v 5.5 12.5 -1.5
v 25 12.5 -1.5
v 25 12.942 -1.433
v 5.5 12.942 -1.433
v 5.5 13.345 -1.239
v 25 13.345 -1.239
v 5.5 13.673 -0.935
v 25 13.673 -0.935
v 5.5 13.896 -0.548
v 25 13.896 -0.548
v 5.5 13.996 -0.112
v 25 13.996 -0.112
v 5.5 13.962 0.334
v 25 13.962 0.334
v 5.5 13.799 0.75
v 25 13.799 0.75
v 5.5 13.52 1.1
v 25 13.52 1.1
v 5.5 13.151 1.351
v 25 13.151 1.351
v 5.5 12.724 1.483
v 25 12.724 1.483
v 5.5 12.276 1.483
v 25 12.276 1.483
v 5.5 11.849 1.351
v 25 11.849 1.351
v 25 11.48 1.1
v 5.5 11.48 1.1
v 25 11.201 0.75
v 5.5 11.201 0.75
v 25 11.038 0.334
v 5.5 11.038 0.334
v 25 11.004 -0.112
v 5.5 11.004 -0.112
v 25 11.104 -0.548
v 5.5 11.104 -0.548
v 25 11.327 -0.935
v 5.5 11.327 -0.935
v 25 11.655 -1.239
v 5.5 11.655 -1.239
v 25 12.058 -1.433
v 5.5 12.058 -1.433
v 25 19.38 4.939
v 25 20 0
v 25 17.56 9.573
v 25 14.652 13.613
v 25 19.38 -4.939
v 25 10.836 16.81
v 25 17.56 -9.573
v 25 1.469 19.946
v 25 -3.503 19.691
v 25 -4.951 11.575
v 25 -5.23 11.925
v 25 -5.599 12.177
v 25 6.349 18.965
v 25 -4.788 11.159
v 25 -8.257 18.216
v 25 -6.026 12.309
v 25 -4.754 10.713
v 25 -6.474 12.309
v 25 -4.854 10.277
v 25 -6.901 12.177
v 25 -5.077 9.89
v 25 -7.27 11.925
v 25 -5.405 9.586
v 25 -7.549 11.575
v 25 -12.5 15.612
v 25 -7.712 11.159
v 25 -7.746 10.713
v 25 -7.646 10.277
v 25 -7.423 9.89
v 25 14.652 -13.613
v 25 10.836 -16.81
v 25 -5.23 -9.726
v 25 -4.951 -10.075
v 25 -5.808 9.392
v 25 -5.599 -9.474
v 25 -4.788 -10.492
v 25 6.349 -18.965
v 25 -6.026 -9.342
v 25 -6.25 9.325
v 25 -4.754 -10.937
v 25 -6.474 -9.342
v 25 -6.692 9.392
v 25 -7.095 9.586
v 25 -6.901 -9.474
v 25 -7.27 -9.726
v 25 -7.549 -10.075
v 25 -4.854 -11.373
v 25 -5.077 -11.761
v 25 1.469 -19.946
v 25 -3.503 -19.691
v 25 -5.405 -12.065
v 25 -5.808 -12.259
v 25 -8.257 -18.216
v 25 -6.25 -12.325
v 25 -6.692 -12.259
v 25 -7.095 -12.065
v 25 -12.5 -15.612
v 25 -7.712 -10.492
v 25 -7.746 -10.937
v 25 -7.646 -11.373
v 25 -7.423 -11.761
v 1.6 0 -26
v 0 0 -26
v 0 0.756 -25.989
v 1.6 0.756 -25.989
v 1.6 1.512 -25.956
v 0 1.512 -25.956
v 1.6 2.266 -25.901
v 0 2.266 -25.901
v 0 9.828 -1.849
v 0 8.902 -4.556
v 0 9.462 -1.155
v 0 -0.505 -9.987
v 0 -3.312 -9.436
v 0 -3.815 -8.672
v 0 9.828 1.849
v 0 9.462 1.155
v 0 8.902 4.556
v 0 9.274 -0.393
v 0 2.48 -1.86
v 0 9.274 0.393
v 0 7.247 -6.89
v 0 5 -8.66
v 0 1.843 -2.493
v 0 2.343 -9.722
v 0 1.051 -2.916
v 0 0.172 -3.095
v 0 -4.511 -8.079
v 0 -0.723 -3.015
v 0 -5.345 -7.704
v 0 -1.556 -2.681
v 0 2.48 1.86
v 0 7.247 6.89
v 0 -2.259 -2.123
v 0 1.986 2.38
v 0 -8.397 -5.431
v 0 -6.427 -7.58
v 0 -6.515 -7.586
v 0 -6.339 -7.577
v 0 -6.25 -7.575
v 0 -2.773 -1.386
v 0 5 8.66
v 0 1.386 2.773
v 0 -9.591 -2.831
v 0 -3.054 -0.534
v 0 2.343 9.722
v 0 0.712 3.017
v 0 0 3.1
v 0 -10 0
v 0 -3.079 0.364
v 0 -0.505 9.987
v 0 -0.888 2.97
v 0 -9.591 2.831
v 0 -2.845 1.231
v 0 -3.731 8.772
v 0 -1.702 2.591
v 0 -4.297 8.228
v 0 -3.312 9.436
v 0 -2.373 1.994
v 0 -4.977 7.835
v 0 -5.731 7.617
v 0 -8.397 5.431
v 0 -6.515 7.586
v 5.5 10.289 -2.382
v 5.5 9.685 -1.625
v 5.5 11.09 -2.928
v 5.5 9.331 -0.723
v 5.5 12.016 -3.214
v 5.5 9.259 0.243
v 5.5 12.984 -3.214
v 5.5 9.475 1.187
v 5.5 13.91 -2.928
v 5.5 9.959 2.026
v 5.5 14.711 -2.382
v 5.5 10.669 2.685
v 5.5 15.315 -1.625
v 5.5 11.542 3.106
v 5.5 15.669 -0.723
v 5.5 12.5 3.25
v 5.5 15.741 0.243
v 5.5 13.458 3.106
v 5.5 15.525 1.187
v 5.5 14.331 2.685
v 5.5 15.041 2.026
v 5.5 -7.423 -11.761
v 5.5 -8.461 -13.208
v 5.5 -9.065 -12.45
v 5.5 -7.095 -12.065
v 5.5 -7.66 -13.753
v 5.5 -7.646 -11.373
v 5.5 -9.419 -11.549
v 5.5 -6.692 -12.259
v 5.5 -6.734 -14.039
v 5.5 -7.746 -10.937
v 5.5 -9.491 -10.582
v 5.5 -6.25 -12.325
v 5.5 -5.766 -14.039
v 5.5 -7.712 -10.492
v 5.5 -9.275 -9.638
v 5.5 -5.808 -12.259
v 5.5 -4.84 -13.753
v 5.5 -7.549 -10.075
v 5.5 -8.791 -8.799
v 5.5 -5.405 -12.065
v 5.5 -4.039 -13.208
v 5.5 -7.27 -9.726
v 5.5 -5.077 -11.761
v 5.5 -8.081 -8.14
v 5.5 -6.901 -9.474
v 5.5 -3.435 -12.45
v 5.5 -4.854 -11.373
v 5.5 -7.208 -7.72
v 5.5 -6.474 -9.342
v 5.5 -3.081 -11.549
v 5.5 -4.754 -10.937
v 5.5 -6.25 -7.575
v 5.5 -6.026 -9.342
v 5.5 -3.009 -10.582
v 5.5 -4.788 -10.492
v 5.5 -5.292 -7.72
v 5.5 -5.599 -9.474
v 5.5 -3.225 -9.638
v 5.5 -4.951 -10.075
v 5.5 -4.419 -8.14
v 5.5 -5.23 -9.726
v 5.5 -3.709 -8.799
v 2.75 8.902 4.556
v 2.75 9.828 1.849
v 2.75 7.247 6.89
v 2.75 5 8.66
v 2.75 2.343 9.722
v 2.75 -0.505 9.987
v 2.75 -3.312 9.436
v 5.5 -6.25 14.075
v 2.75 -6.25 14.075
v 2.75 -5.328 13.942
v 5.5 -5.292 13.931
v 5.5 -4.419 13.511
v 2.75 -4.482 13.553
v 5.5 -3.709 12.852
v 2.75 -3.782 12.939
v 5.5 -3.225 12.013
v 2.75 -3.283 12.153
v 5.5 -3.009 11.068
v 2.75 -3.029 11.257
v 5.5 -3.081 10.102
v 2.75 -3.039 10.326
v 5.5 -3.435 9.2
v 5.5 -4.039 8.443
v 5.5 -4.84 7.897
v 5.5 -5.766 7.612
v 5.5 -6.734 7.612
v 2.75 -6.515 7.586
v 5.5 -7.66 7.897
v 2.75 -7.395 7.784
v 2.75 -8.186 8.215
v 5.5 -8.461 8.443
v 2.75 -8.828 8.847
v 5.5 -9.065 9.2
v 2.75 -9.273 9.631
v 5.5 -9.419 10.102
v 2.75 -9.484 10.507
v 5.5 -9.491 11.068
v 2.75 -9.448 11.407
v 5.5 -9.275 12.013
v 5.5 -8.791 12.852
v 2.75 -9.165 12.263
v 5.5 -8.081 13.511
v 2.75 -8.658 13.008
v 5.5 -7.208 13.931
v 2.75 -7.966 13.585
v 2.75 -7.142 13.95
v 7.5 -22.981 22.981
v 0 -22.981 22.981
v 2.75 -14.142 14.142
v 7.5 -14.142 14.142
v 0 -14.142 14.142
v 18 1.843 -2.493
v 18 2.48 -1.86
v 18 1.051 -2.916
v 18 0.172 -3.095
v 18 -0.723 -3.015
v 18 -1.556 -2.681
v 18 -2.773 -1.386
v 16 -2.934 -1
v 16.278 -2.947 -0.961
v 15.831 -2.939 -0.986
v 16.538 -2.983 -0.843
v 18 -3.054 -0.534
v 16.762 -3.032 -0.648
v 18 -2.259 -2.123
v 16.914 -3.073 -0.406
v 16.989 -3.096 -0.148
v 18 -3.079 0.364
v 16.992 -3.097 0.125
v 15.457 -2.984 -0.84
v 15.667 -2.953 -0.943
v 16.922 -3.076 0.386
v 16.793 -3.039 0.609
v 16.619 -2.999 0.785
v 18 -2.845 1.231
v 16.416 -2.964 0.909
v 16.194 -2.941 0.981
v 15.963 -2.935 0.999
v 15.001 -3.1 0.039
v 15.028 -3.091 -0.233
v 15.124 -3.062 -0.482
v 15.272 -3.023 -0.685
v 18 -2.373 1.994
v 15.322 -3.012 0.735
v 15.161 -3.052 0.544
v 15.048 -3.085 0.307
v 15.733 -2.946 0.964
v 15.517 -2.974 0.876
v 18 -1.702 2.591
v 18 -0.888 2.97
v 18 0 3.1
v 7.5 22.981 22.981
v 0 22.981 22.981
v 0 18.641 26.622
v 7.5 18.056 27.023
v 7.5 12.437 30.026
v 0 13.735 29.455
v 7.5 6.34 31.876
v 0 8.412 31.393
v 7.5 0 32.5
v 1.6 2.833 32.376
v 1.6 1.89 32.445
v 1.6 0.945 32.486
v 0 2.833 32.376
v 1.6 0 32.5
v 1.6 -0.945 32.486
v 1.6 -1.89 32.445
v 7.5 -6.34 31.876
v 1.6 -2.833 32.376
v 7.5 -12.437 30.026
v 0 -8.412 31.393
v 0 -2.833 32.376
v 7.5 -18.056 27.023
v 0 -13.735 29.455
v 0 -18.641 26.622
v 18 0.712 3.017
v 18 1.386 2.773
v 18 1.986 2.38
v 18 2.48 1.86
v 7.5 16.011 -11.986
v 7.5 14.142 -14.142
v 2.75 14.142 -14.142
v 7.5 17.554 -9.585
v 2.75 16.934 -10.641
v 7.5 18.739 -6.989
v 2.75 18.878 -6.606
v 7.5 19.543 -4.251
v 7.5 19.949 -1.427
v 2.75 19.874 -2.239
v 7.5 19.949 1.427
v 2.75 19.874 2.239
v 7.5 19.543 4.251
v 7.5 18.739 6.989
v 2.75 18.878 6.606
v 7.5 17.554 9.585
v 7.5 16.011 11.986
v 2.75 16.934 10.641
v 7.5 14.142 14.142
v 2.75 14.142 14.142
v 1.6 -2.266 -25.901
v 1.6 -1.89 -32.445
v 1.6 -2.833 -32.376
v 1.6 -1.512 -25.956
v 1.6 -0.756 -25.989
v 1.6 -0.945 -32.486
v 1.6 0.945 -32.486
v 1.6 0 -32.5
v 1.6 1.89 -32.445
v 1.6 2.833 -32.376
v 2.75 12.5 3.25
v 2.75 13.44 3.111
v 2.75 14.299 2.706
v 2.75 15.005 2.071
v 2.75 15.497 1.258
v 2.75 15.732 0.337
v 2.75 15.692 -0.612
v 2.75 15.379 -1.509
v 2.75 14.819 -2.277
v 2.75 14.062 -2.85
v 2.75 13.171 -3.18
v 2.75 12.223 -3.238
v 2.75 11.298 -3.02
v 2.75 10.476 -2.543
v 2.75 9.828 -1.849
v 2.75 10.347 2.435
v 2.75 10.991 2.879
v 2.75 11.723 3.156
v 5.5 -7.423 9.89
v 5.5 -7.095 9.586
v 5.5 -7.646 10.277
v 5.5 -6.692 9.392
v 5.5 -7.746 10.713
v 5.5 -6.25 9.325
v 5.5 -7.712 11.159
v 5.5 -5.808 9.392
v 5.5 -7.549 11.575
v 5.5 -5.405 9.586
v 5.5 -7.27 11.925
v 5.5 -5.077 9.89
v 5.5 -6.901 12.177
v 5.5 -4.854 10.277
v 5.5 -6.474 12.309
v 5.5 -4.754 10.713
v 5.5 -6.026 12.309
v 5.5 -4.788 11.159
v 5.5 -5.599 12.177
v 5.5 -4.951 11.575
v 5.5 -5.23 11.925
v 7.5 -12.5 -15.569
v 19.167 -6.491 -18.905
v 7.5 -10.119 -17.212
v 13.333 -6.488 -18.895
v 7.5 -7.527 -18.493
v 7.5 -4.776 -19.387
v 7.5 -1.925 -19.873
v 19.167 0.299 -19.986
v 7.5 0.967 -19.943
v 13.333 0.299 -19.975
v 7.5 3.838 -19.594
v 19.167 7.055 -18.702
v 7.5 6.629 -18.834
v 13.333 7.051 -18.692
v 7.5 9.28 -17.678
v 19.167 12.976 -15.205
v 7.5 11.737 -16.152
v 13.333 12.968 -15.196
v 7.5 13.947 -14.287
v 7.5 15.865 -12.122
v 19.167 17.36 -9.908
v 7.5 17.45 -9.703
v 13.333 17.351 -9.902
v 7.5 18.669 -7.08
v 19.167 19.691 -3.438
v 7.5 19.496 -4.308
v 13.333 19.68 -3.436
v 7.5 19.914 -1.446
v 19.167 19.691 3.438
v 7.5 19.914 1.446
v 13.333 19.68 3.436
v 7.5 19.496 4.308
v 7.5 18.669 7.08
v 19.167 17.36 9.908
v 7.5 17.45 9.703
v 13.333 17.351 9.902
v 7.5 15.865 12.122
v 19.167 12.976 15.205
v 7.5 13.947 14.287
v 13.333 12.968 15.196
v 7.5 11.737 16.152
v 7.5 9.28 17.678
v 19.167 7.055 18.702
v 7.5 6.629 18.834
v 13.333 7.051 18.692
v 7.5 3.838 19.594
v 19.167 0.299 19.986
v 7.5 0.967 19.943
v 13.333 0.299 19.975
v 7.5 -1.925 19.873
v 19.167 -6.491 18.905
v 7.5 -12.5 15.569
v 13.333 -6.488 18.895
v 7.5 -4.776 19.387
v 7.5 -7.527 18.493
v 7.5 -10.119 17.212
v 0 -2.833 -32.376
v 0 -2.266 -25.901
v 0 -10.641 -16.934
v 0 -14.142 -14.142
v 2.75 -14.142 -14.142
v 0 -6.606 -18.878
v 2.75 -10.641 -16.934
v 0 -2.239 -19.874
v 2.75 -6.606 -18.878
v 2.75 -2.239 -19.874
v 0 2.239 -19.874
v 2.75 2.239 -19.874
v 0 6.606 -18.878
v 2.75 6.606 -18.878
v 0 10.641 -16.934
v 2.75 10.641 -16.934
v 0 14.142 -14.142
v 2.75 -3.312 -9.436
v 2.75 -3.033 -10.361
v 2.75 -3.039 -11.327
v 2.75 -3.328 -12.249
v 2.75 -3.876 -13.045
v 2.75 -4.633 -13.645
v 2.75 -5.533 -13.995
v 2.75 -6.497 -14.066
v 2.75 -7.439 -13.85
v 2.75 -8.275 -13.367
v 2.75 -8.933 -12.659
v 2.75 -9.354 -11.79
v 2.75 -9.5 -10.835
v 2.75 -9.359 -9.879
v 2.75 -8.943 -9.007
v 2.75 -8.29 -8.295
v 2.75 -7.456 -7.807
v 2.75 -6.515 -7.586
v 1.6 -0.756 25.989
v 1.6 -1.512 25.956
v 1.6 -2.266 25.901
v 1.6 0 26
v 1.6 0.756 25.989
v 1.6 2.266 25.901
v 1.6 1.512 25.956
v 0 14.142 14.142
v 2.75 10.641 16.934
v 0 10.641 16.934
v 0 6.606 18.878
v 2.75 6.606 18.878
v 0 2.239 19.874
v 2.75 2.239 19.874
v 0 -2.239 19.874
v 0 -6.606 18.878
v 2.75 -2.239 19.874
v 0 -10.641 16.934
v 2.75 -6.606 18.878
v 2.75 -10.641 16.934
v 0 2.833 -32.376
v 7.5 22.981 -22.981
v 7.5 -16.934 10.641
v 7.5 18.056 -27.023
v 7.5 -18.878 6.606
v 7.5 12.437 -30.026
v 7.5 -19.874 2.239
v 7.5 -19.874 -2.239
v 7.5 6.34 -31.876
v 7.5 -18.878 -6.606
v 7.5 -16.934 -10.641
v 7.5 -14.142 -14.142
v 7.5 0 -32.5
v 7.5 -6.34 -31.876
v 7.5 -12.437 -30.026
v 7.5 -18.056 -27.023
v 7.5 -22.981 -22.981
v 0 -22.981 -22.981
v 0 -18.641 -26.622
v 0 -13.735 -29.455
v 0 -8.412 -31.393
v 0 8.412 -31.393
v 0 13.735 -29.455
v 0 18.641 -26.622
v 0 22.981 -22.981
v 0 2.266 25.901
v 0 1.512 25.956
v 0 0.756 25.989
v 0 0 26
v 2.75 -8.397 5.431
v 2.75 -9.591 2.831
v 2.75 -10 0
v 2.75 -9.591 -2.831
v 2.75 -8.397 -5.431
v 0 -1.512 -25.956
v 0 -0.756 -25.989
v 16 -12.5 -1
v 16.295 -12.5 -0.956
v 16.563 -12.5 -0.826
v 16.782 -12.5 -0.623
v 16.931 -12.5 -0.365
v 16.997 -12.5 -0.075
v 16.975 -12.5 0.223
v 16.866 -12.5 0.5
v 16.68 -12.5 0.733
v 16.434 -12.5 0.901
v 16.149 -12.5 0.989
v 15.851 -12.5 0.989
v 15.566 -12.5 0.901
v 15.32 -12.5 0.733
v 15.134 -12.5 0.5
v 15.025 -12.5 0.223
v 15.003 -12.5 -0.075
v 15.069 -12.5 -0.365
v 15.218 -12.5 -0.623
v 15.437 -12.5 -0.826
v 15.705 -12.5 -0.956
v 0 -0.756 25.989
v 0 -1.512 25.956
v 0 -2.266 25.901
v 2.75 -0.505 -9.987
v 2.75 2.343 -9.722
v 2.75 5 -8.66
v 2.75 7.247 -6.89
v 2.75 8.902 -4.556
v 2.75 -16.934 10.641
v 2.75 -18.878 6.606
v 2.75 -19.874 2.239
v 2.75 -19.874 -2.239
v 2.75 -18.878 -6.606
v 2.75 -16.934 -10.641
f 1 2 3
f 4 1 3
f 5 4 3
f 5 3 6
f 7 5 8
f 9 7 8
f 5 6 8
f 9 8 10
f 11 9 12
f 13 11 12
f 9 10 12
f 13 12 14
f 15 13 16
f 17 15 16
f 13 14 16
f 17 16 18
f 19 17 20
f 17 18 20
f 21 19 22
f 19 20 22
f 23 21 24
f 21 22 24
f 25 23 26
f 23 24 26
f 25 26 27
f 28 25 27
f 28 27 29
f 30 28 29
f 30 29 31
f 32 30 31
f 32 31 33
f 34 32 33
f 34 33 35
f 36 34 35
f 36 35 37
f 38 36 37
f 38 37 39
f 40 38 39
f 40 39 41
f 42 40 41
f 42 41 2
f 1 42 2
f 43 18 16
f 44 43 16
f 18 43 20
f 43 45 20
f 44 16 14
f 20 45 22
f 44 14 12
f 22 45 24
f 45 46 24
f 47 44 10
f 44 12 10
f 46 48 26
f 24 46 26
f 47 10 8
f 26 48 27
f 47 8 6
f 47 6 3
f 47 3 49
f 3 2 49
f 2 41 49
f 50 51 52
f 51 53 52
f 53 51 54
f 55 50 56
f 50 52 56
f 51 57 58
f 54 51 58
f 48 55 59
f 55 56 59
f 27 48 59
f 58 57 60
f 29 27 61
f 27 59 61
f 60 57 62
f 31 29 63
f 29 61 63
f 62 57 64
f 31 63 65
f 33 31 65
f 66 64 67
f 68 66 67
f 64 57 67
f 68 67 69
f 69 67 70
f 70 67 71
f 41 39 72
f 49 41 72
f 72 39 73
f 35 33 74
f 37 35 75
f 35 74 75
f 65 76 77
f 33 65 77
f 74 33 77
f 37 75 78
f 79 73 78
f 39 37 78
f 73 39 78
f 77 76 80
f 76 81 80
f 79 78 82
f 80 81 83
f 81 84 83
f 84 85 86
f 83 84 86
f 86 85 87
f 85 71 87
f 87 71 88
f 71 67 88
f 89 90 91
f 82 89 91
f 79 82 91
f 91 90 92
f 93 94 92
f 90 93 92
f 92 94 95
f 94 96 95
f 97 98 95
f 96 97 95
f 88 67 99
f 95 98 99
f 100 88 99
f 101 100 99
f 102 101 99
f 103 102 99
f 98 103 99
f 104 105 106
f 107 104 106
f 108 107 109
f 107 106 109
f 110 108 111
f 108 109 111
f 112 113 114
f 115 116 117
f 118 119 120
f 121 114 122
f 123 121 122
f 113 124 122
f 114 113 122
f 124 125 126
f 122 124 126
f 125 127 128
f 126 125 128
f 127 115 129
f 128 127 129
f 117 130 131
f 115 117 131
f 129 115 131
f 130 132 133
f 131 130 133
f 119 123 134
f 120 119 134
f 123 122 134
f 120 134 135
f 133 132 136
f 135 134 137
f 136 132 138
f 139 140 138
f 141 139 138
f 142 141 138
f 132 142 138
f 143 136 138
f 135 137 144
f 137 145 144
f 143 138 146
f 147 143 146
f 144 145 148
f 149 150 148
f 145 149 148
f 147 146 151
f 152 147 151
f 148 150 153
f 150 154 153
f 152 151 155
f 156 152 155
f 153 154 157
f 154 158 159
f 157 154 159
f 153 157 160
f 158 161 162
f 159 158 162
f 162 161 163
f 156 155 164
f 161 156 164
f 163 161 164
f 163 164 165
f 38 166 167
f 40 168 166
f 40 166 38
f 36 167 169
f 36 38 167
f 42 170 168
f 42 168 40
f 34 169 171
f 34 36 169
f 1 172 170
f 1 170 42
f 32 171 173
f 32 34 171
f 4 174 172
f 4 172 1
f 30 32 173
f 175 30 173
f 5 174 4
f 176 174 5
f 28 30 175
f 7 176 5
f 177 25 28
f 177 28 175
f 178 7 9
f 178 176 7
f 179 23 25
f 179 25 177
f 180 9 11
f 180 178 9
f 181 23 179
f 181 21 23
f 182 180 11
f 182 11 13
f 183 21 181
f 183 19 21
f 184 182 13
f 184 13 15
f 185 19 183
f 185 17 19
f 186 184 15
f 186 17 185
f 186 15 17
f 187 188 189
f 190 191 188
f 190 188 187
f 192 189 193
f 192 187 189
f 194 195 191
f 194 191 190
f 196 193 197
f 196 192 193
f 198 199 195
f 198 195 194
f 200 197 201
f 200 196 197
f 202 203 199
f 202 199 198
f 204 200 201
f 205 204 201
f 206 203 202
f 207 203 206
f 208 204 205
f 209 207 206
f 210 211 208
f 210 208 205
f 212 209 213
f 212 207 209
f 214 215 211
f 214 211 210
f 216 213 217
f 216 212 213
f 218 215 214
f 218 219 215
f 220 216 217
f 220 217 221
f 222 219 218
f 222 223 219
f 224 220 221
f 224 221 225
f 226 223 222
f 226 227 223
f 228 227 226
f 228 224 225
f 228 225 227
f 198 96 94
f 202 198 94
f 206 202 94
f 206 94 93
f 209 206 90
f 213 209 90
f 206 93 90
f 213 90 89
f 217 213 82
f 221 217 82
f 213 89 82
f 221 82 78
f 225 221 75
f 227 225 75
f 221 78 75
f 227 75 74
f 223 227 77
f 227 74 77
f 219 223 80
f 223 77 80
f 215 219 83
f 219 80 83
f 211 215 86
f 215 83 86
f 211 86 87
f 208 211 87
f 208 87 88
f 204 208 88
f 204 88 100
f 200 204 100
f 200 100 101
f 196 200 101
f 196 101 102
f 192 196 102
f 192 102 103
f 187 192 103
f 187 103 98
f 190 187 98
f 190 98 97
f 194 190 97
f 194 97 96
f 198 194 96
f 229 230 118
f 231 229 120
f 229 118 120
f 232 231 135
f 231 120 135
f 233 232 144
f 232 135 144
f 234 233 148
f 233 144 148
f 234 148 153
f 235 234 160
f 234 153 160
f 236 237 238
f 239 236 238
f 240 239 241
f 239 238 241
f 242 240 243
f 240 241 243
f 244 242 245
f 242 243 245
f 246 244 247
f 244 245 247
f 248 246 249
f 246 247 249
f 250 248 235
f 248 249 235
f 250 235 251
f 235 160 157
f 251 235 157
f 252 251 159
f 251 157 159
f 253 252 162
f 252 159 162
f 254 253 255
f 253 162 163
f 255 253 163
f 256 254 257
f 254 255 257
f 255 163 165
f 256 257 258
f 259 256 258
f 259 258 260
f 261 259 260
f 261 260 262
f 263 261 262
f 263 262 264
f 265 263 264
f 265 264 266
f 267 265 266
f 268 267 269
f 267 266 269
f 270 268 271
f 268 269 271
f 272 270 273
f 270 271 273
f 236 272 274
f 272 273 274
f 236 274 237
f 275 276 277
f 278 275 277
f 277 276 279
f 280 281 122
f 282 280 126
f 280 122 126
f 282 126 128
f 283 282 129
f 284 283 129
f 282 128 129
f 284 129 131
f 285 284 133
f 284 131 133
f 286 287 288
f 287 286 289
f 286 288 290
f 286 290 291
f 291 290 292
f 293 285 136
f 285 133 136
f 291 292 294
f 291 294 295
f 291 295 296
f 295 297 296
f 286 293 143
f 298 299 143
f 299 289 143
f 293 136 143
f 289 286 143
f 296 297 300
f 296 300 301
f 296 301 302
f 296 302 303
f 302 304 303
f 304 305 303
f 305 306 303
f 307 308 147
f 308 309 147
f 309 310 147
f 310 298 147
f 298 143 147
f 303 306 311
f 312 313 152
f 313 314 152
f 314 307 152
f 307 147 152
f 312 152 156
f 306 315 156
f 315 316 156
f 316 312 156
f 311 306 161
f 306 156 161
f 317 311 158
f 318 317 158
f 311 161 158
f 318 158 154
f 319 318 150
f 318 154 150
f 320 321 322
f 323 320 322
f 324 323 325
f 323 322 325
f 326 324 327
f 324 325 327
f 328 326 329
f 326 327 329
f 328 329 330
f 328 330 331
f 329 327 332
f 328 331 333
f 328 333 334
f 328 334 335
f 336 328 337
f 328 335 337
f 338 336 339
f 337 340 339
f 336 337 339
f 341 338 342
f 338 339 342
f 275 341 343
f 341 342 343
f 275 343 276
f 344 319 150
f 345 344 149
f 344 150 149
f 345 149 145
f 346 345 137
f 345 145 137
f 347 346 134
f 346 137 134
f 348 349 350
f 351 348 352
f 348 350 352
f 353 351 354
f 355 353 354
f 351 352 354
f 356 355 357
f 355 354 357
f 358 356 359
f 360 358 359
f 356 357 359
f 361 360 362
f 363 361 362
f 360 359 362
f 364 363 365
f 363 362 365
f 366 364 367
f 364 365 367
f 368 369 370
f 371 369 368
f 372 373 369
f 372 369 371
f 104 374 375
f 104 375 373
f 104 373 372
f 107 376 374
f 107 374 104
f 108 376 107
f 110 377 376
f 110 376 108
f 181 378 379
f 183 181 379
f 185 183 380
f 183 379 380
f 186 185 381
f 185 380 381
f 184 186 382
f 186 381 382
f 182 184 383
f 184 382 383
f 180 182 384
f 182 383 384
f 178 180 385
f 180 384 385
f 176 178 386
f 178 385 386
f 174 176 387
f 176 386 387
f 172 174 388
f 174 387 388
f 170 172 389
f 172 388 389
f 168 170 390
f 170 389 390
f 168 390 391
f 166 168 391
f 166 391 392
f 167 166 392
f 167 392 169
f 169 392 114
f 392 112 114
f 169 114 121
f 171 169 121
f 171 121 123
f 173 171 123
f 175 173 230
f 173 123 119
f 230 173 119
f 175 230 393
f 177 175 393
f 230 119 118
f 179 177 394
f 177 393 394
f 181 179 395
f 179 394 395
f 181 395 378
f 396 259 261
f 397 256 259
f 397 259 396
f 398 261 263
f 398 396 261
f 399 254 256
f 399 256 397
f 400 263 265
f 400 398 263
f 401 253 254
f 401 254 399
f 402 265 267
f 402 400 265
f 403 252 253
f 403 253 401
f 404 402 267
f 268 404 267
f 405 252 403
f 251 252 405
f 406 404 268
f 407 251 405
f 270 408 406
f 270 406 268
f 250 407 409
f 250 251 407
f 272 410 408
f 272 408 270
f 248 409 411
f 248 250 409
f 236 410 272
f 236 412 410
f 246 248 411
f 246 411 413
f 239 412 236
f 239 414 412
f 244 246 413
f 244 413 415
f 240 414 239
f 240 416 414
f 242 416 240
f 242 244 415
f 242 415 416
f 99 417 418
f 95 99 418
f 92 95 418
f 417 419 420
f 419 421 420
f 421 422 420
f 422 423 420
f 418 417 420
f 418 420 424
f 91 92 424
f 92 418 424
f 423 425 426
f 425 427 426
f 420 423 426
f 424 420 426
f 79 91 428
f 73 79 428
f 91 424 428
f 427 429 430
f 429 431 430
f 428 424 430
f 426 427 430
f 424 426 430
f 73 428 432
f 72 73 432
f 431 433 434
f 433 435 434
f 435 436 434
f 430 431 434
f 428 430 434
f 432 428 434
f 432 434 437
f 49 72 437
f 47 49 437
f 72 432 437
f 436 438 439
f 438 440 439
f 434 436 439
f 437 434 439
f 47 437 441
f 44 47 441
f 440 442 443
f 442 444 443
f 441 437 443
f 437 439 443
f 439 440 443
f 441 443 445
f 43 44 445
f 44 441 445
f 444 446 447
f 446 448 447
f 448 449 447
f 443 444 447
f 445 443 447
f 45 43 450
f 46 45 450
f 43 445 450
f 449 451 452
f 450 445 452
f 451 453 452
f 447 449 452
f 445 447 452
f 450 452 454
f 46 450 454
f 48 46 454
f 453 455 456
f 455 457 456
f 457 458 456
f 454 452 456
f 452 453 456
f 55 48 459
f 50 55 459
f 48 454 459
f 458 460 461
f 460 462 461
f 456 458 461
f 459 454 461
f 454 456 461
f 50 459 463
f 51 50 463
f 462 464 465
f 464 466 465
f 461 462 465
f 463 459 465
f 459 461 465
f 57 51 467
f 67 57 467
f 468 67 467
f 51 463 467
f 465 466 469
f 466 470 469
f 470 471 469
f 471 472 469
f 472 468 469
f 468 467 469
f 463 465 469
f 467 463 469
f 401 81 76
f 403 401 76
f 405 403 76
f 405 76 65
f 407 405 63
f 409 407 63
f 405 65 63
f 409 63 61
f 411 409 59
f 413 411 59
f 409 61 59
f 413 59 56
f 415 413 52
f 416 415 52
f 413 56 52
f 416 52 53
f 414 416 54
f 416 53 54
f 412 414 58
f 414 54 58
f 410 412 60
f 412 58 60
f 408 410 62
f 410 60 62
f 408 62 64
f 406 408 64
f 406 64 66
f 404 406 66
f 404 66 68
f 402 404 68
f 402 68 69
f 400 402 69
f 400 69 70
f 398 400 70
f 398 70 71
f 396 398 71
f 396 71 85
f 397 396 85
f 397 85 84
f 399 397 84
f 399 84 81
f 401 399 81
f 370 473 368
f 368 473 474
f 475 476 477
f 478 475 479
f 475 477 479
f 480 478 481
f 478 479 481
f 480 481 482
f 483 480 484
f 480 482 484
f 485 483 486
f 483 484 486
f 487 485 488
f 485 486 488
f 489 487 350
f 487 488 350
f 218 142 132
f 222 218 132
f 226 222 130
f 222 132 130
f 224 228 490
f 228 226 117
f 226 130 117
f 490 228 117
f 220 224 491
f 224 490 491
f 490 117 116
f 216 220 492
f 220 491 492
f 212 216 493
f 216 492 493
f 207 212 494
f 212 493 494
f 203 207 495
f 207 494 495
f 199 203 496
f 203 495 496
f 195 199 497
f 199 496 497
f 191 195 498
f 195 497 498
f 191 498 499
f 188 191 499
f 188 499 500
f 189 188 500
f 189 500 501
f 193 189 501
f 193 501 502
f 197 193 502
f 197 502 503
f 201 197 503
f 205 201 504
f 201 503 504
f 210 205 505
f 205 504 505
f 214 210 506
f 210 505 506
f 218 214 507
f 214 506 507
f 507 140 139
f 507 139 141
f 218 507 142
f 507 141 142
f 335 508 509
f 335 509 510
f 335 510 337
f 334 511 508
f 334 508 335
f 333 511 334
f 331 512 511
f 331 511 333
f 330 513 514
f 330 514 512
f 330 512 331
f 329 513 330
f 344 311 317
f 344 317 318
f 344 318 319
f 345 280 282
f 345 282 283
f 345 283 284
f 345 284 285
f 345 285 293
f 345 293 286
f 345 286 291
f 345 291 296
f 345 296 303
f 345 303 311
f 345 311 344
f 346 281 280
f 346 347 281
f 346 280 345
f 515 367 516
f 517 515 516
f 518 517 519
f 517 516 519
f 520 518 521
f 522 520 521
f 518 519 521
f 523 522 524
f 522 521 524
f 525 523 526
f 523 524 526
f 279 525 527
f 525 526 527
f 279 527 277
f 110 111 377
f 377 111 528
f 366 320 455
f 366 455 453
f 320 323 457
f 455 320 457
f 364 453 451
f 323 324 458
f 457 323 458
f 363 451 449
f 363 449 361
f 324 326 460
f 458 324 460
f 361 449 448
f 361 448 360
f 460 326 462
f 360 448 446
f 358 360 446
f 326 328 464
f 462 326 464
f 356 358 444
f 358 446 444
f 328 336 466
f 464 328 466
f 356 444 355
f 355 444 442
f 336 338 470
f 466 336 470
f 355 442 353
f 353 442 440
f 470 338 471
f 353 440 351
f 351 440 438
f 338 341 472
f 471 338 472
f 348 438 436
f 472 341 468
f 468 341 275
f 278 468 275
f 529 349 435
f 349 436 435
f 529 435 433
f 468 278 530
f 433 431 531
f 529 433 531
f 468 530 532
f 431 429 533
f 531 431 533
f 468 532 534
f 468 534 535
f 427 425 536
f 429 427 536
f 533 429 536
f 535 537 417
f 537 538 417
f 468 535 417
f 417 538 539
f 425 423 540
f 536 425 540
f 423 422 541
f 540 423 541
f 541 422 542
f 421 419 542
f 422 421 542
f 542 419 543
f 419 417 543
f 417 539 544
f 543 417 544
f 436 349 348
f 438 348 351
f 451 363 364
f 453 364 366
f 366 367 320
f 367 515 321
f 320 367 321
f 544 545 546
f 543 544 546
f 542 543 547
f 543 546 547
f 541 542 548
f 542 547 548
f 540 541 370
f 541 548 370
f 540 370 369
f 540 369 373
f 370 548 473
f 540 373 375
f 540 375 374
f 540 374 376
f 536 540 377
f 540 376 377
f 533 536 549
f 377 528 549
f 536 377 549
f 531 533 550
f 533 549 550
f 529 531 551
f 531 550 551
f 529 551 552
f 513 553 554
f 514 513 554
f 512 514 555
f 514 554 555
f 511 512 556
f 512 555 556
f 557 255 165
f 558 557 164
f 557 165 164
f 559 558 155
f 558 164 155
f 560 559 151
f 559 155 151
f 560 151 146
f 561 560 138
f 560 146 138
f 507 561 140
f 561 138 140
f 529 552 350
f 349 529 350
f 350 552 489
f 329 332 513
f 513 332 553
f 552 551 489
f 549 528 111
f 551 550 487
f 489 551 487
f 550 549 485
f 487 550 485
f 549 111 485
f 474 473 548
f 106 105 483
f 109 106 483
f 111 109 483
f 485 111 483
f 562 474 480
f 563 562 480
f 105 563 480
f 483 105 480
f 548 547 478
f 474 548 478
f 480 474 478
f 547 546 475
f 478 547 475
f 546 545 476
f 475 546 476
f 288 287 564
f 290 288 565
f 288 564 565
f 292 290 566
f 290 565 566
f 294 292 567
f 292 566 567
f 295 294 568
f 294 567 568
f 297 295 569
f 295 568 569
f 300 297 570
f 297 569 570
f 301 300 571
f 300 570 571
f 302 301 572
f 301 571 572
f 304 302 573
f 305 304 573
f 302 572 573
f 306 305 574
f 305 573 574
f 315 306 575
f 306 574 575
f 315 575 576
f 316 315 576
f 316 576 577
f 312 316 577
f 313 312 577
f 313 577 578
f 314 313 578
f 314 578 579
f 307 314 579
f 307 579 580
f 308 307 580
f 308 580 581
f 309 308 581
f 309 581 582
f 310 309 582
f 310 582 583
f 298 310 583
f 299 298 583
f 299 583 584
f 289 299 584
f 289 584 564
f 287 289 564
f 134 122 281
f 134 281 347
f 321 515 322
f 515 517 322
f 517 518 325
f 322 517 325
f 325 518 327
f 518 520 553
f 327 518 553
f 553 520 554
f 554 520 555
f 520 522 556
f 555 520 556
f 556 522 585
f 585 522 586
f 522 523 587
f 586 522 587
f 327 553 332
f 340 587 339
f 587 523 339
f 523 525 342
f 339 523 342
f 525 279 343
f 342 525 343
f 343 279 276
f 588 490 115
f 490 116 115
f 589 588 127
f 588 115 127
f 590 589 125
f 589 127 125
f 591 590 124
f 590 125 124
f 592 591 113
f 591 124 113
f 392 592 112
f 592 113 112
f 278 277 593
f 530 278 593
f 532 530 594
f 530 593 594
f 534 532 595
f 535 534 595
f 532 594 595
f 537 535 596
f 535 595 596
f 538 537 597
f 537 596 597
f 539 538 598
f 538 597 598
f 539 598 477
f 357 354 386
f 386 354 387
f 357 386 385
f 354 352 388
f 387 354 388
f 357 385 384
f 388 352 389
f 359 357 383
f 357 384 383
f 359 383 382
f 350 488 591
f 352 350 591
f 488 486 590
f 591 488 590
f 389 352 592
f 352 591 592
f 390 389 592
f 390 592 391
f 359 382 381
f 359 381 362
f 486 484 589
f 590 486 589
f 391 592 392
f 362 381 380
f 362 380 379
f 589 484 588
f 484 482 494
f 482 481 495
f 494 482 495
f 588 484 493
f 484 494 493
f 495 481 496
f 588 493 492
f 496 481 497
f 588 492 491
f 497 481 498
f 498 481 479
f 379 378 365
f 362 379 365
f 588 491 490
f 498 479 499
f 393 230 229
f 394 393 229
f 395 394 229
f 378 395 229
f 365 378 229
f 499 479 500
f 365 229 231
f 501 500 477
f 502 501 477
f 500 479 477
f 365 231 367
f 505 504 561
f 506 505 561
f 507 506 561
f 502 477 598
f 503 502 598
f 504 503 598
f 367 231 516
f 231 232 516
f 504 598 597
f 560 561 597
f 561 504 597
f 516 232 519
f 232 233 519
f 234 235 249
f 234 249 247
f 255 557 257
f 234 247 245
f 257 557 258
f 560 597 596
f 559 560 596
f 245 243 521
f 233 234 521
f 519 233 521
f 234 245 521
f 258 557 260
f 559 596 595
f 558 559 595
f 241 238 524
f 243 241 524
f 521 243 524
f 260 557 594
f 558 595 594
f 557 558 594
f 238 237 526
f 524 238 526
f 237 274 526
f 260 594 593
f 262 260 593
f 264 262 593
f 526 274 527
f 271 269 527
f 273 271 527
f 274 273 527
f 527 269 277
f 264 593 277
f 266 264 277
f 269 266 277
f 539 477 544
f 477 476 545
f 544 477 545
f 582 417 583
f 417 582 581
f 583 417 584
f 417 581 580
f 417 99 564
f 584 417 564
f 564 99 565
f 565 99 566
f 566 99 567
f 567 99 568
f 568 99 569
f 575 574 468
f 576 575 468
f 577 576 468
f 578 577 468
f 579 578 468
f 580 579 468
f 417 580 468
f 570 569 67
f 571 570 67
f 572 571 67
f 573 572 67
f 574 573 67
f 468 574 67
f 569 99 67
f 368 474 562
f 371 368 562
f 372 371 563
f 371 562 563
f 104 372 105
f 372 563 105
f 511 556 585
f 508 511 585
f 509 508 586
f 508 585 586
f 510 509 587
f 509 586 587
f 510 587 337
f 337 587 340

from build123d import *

# Parameters (mm, degrees)
CORTAR_EXTRUIR2_DEPTH  = 7.5
CROQUIS5_R             = 1.5
CORTAR_EXTRUIR4_DEPTH  = 25
CORTAR_EXTRUIR14_DEPTH = 1.6
CORTAR_EXTRUIR15_DEPTH = 18
CORTAR_EXTRUIR18_DEPTH = 17.5
CROQUIS21_R            = 1
CORTAR_EXTRUIR19_DEPTH = 12.5
CROQUIS22_R            = 3.25
CORTAR_EXTRUIR20_DEPTH = 5.5


with BuildPart() as part:
    # Croquis1 → Revolución1 (revolve)
    with BuildSketch(Plane(origin=(0, 0, 0), x_dir=(1, 0, 0), z_dir=(0, 1, 0)), mode=Mode.PRIVATE) as revoluci_n1_sk:
        Polygon((0, 0), (25, 0), (25, 20), (7.5, 19.966144384), (7.5, 32.5), (0, 32.5), (0, 20), (2.75, 20), (2.75, 10), (0, 10), align=None)
    revolve(revoluci_n1_sk.sketch.rotate(Axis((0, 0, 0), (1, 0, 0)), 180), axis=Axis((0, 0, 0), (1, 0, 0)))

    # Croquis2 → Cortar-Extruir2 (cut)
    with BuildSketch(Plane.ZY):
        with BuildLine():
            ThreePointArc((-14.142135624, 14.142135624), (0, 20), (14.142135624, 14.142135624))
            Line((14.142135624, 14.142135624), (22.980970389, 22.980970389))
            ThreePointArc((22.980970389, 22.980970389), (0, 32.5), (-22.980970389, 22.980970389))
            Line((-22.980970389, 22.980970389), (-14.142135624, 14.142135624))
        make_face()
        with BuildLine():
            Line((22.980970389, -22.980970389), (14.142135624, -14.142135624))
            ThreePointArc((14.142135624, -14.142135624), (0, -20), (-14.142135624, -14.142135624))
            Line((-14.142135624, -14.142135624), (-22.980970389, -22.980970389))
            ThreePointArc((-22.980970389, -22.980970389), (0, -32.5), (22.980970389, -22.980970389))
        make_face()
    extrude(amount=-CORTAR_EXTRUIR2_DEPTH, mode=Mode.SUBTRACT)

    # Croquis5 → Cortar-Extruir4 (cut)
    with BuildSketch(Plane(origin=(25, 0, 0), x_dir=(0, 0, -1), z_dir=(1, 0, 0))):
        with Locations((0, 12.5)):
            Circle(CROQUIS5_R)
        with Locations((10.825317547, -6.25)):
            Circle(CROQUIS5_R)
        with Locations((-10.825317547, -6.25)):
            Circle(CROQUIS5_R)
    extrude(amount=-CORTAR_EXTRUIR4_DEPTH, mode=Mode.SUBTRACT)

    # Croquis17 → Cortar-Extruir14 (cut)
    with BuildSketch(Plane.ZY):
        with BuildLine():
            Line((26, 0), (32.5, 0))
            ThreePointArc((32.5, 0), (32.469067201, 1.417630089), (32.376327688, 2.832561639))
            Line((32.376327688, 2.832561639), (25.90106215, 2.266049311))
            ThreePointArc((25.90106215, 2.266049311), (25.975253761, 1.134104071), (26, 0))
        make_face()
        with BuildLine():
            ThreePointArc((32.376327688, -2.832561639), (32.469067201, -1.417630089), (32.5, 0))
            Line((32.5, 0), (26, 0))
            ThreePointArc((26, 0), (25.975253761, -1.134104071), (25.90106215, -2.266049311))
            Line((25.90106215, -2.266049311), (32.376327688, -2.832561639))
        make_face()
        with BuildLine():
            Line((-25.90106215, 2.266049311), (-32.376327688, 2.832561639))
            ThreePointArc((-32.376327688, 2.832561639), (-32.469067201, 1.417630089), (-32.5, 0))
            Line((-32.5, 0), (-26, 0))
            ThreePointArc((-26, 0), (-25.975253761, 1.134104071), (-25.90106215, 2.266049311))
        make_face()
        with BuildLine():
            ThreePointArc((-32.5, 0), (-32.469067201, -1.417630089), (-32.376327688, -2.832561639))
            Line((-32.376327688, -2.832561639), (-25.90106215, -2.266049311))
            ThreePointArc((-25.90106215, -2.266049311), (-25.975253761, -1.134104071), (-26, 0))
            Line((-26, 0), (-32.5, 0))
        make_face()
    extrude(amount=-CORTAR_EXTRUIR14_DEPTH, mode=Mode.SUBTRACT)

    # Croquis18 → Cortar-Extruir15 (cut)
    with BuildSketch(Plane.ZY):
        with BuildLine():
            Line((0, 0), (-1.86, 2.48))
            ThreePointArc((-1.86, 2.48), (-1.386362146, -2.772724292), (3.1, 0))
            ThreePointArc((3.1, 0), (2.772724292, 1.386362146), (1.86, 2.48))
            Line((1.86, 2.48), (0, 0))
        make_face()
        Polygon((0, 0), (-1.86, 2.48), (1.86, 2.48), align=None)
    extrude(amount=-CORTAR_EXTRUIR15_DEPTH, mode=Mode.SUBTRACT)

    # Croquis20 → Cortar-Extruir18 (cut)
    with BuildSketch(Plane(origin=(25, 0, 0), x_dir=(0, 0, -1), z_dir=(1, 0, 0))):
        with BuildLine():
            Line((0, -12.5), (-15.612494996, -12.5))
            ThreePointArc((-15.612494996, -12.5), (0, -20), (15.612494996, -12.5))
            Line((15.612494996, -12.5), (0, -12.5))
        make_face()
    extrude(amount=-CORTAR_EXTRUIR18_DEPTH, mode=Mode.SUBTRACT)

    # Croquis21 → Cortar-Extruir19 (cut)
    with BuildSketch(Plane.XZ.offset(12.5)):
        with Locations(Location((16, 0, 0), (0, 0, 270))):
            Circle(CROQUIS21_R)
    extrude(amount=-CORTAR_EXTRUIR19_DEPTH, mode=Mode.SUBTRACT)

    # Croquis22 → Cortar-Extruir20 (cut)
    with BuildSketch(Plane.ZY):
        with Locations((0, 12.5)):
            Circle(CROQUIS22_R)
        with Locations((10.825317547, -6.25)):
            Circle(CROQUIS22_R)
        with Locations((-10.825317547, -6.25)):
            Circle(CROQUIS22_R)
    extrude(amount=-CORTAR_EXTRUIR20_DEPTH, mode=Mode.SUBTRACT)


solid = part.part
